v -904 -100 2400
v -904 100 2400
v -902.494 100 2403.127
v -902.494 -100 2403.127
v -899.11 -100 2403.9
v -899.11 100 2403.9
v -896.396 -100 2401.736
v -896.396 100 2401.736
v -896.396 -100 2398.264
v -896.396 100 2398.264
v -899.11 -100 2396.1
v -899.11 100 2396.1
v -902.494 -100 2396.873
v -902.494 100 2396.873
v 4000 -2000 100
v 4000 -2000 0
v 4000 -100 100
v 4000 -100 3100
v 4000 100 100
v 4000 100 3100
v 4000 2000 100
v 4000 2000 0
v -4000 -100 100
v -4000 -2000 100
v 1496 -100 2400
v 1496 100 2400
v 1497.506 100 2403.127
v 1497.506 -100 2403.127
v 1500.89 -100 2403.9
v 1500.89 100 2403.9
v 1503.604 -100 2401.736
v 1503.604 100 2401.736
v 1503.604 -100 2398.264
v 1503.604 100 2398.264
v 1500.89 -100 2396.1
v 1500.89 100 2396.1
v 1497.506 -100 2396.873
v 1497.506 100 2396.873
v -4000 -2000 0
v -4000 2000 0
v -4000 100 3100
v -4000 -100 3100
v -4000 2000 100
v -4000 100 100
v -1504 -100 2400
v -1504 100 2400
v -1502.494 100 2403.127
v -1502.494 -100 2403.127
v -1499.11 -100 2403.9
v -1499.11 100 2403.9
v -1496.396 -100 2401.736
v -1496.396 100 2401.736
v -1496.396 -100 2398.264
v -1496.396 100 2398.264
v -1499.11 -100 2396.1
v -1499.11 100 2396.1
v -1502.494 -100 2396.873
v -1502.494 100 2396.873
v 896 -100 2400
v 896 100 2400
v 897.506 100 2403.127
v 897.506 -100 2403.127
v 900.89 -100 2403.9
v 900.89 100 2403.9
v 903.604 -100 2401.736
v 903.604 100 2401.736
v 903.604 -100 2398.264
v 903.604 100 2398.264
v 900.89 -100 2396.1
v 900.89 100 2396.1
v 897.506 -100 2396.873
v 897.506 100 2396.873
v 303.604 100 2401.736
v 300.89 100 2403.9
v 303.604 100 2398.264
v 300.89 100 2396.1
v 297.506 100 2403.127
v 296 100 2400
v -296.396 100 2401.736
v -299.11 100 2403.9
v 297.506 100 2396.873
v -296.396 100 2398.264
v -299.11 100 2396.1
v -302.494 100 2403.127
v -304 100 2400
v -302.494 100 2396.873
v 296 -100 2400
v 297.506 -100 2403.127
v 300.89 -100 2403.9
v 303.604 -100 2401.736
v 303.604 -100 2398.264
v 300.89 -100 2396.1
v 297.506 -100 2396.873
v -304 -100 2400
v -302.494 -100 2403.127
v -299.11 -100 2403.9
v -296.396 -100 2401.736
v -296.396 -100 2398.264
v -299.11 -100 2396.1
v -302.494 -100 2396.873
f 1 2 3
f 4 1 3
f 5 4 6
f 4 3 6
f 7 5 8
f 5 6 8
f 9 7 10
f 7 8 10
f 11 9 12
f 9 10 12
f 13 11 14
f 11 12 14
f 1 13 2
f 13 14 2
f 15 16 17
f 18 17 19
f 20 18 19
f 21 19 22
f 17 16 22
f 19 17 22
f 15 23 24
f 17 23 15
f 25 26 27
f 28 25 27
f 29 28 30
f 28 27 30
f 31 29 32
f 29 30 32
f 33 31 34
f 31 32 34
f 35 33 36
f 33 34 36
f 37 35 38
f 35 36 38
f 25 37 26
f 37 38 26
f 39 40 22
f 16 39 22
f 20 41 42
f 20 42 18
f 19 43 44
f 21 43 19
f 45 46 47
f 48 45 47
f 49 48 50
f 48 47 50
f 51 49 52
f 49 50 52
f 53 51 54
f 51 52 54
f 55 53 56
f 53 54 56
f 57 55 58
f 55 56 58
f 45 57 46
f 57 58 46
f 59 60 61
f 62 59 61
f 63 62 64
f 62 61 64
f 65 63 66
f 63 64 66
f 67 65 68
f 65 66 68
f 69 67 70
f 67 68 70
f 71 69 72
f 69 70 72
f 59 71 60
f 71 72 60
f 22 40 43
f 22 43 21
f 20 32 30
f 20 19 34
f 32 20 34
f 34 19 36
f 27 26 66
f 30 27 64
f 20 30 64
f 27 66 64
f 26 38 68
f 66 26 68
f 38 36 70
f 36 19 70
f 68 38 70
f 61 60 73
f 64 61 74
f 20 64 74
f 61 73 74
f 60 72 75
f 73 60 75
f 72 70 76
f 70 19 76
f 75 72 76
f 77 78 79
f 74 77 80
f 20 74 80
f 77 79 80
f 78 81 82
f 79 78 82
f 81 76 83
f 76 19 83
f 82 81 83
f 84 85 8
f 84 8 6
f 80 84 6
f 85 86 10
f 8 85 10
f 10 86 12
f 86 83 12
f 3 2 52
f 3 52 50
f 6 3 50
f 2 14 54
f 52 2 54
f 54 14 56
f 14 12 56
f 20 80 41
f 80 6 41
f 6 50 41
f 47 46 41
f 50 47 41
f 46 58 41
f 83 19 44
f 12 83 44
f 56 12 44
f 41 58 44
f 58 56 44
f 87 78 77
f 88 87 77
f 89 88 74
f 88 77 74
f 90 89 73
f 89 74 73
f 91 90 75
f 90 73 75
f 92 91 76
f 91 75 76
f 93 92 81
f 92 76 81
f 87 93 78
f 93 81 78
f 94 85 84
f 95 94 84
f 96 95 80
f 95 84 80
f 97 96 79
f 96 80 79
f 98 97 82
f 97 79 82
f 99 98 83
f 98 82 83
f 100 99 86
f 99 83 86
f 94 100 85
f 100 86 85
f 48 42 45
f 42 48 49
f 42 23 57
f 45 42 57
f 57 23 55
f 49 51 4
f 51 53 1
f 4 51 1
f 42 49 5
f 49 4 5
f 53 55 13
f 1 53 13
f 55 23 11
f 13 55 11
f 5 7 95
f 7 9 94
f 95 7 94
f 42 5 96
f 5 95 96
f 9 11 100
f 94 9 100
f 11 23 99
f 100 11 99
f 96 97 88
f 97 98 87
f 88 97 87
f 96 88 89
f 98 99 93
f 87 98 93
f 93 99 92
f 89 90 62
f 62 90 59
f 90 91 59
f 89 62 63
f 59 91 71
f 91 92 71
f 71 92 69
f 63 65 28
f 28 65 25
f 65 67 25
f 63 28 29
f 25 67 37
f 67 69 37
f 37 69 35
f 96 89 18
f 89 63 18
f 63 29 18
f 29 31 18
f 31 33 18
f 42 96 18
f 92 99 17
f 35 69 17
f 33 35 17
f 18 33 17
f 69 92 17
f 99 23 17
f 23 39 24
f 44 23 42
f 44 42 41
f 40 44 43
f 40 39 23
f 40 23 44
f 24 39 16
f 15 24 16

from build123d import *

# Parameters (mm, degrees)
F0_W     = 8000
F0_H     = 4000
F1_DEPTH = 100
F3_DEPTH = 3000
F5_D     = 8


with BuildPart() as f1:
    # F0 (on Top) → F1 (new body)
    with BuildSketch(Plane.XY):
        Rectangle(F0_W, F0_H)
    extrude(amount=F1_DEPTH)

    # F2 (on face) → F3 (join)
    with BuildSketch(Plane.XY.offset(100)):
        Polygon((-4000, 100), (-4000, 0), (-4000, -100), (4000, -100), (4000, 100), align=None)
    extrude(amount=F3_DEPTH)

    # F5 (through all)
    with Locations(Plane.XZ.offset(100)):
        with Locations((-1500, 2400), (-900, 2400), (-300, 2400), (300, 2400), (900, 2400), (1500, 2400)):
            Hole(F5_D / 2)


solid = f1.part
